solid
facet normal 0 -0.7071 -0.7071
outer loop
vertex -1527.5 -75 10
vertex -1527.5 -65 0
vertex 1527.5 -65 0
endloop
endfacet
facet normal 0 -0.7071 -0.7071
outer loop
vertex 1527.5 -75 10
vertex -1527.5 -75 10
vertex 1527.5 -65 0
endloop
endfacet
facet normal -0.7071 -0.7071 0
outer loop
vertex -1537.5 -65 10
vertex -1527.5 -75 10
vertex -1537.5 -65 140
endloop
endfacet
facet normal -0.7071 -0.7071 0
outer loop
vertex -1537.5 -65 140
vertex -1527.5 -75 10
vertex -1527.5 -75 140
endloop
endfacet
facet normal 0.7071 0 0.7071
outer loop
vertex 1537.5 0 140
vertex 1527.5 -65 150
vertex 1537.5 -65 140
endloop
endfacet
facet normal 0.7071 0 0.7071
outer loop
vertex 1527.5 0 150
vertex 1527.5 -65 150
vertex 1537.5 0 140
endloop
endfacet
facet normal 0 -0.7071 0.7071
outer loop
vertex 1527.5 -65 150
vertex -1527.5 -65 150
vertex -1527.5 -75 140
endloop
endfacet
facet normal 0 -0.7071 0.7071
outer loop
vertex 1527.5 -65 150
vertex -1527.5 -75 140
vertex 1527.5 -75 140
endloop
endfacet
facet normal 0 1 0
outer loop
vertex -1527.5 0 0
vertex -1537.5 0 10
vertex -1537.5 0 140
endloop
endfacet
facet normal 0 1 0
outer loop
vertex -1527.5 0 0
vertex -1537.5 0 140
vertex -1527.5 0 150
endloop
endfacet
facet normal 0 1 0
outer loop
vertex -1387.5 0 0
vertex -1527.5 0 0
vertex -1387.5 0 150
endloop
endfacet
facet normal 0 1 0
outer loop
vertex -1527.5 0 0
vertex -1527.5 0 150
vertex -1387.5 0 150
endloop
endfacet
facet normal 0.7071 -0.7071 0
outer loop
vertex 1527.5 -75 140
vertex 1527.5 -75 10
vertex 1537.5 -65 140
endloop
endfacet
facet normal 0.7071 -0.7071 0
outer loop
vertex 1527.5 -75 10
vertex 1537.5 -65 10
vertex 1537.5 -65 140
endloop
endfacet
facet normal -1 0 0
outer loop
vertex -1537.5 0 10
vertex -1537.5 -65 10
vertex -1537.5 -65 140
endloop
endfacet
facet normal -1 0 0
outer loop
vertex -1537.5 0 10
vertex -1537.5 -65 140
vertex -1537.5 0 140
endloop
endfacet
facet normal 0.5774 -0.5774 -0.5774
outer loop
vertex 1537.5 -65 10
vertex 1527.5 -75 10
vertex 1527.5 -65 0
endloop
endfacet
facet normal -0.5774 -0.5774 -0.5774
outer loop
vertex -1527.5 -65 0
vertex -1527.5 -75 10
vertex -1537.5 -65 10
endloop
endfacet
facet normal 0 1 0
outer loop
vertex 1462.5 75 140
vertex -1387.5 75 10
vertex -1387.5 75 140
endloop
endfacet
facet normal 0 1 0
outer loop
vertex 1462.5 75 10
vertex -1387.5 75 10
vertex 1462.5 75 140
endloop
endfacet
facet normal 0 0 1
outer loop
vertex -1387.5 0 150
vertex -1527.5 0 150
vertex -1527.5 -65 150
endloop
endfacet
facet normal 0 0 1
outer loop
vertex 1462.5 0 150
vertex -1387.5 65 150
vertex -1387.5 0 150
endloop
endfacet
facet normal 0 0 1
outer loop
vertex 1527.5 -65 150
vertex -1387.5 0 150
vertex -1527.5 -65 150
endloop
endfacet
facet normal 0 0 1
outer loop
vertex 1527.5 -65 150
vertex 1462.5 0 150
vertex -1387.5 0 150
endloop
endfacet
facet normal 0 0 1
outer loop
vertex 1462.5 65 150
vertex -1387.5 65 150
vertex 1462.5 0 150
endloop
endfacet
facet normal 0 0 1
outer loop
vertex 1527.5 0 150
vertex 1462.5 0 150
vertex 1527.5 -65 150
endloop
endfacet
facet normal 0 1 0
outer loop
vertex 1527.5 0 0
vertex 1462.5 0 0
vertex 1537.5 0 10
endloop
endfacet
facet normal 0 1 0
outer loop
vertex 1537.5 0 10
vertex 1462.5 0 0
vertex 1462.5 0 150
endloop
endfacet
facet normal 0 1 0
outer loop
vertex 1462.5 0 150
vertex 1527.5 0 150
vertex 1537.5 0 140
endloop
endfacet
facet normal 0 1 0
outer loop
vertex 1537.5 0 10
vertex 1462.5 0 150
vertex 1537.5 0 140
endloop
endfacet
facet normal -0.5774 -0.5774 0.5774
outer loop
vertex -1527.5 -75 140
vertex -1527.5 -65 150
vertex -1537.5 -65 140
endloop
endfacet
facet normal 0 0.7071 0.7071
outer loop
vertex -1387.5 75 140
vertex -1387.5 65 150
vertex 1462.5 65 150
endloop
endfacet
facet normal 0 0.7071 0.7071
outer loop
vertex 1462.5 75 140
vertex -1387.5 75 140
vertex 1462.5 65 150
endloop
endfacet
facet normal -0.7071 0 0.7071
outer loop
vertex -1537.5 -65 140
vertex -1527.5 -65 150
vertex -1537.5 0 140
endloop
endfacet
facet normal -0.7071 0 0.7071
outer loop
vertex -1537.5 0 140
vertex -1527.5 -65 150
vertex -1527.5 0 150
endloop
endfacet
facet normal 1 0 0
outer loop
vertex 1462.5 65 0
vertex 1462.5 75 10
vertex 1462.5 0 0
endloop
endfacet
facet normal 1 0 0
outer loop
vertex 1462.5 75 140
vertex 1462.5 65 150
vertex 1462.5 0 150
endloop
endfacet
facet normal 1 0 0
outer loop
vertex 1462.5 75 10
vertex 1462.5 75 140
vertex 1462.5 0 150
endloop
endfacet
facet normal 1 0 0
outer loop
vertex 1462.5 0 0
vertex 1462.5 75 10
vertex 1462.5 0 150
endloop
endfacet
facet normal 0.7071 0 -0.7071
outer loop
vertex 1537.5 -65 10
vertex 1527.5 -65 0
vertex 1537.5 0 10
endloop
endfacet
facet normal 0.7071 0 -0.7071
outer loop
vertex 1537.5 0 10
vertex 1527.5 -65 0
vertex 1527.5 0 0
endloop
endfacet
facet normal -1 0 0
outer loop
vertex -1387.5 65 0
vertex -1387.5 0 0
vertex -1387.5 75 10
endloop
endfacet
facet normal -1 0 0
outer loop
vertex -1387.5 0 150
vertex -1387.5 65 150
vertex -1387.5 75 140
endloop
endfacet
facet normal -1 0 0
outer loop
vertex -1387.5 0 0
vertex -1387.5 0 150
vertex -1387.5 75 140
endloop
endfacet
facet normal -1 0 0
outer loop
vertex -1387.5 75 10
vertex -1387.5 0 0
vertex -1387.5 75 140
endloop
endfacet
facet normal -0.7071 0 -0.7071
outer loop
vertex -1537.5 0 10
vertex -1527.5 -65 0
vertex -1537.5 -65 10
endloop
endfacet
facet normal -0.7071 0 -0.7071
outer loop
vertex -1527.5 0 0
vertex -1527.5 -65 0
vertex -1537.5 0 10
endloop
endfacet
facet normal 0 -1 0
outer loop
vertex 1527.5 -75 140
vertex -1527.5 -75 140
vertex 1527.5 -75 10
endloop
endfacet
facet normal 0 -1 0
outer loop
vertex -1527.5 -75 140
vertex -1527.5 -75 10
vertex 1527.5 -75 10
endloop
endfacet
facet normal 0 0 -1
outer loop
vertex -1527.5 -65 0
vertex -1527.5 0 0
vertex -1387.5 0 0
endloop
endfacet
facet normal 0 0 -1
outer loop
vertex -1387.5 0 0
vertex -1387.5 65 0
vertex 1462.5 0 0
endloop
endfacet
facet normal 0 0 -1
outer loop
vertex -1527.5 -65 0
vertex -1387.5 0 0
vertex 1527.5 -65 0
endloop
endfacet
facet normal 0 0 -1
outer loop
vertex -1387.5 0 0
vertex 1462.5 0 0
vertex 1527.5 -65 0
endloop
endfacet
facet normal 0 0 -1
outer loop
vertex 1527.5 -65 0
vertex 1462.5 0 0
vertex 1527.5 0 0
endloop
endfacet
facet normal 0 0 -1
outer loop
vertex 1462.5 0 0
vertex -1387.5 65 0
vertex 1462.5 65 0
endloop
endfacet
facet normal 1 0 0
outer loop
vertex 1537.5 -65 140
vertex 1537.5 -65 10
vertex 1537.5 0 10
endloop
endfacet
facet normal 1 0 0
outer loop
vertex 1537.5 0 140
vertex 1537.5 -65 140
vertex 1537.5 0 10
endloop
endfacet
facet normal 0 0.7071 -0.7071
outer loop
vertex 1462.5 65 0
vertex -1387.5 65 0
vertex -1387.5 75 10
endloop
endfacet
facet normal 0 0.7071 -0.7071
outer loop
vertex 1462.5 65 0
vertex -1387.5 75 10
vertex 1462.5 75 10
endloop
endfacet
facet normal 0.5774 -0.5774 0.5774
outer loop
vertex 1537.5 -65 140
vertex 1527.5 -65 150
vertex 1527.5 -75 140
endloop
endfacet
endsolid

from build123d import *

# Parameters (mm, degrees)
F0_W     = 3075
F0_H     = 150
F1_DEPTH = 150
F2_SIZE  = 10
F3_W     = 65
F3_H     = 65
F4_DEPTH = 150.001
F5_W     = 140
F5_H     = 65
F6_DEPTH = 150.001


with BuildPart() as f1:
    # F0 (on Top) → F1 (new body)
    with BuildSketch(Plane.XY):
        Rectangle(F0_W, F0_H)
    extrude(amount=F1_DEPTH)

    # F2
    f2_edges = [f1.edges().sort_by_distance(p)[0] for p in [
        (0, 75, 150),
        (-1537.5, 0, 150),
        (0, -75, 150),
        (1537.5, 0, 150),
        (-1537.5, -75, 75),
        (1537.5, -75, 75),
        (0, -75, 0),
        (-1537.5, 75, 75),
        (0, 75, 0),
        (-1537.5, 0, 0),
        (1537.5, 0, 0),
        (1537.5, 75, 75),
    ]]
    chamfer(f2_edges, length=F2_SIZE)

    # F3 (on face) → F4 (cut, through all)
    with BuildSketch(Plane.XY.offset(150)):
        Polygon((1537.5, 0), (1537.5, 75), (1462.5, 75), (1462.5, 65), (1527.5, 65), (1527.5, 0), align=None)
        with Locations((1495, 32.5)):
            Rectangle(F3_W, F3_H)
    extrude(amount=-F4_DEPTH, mode=Mode.SUBTRACT)

    # F5 (on face) → F6 (cut, through all)
    with BuildSketch(Plane.XY.offset(150)):
        Polygon((-1387.5, 65), (-1387.5, 75), (-1537.5, 75), (-1537.5, 0), (-1527.5, 0), (-1527.5, 65), align=None)
        with Locations((-1457.5, 32.5)):
            Rectangle(F5_W, F5_H)
    extrude(amount=-F6_DEPTH, mode=Mode.SUBTRACT)


solid = f1.part
